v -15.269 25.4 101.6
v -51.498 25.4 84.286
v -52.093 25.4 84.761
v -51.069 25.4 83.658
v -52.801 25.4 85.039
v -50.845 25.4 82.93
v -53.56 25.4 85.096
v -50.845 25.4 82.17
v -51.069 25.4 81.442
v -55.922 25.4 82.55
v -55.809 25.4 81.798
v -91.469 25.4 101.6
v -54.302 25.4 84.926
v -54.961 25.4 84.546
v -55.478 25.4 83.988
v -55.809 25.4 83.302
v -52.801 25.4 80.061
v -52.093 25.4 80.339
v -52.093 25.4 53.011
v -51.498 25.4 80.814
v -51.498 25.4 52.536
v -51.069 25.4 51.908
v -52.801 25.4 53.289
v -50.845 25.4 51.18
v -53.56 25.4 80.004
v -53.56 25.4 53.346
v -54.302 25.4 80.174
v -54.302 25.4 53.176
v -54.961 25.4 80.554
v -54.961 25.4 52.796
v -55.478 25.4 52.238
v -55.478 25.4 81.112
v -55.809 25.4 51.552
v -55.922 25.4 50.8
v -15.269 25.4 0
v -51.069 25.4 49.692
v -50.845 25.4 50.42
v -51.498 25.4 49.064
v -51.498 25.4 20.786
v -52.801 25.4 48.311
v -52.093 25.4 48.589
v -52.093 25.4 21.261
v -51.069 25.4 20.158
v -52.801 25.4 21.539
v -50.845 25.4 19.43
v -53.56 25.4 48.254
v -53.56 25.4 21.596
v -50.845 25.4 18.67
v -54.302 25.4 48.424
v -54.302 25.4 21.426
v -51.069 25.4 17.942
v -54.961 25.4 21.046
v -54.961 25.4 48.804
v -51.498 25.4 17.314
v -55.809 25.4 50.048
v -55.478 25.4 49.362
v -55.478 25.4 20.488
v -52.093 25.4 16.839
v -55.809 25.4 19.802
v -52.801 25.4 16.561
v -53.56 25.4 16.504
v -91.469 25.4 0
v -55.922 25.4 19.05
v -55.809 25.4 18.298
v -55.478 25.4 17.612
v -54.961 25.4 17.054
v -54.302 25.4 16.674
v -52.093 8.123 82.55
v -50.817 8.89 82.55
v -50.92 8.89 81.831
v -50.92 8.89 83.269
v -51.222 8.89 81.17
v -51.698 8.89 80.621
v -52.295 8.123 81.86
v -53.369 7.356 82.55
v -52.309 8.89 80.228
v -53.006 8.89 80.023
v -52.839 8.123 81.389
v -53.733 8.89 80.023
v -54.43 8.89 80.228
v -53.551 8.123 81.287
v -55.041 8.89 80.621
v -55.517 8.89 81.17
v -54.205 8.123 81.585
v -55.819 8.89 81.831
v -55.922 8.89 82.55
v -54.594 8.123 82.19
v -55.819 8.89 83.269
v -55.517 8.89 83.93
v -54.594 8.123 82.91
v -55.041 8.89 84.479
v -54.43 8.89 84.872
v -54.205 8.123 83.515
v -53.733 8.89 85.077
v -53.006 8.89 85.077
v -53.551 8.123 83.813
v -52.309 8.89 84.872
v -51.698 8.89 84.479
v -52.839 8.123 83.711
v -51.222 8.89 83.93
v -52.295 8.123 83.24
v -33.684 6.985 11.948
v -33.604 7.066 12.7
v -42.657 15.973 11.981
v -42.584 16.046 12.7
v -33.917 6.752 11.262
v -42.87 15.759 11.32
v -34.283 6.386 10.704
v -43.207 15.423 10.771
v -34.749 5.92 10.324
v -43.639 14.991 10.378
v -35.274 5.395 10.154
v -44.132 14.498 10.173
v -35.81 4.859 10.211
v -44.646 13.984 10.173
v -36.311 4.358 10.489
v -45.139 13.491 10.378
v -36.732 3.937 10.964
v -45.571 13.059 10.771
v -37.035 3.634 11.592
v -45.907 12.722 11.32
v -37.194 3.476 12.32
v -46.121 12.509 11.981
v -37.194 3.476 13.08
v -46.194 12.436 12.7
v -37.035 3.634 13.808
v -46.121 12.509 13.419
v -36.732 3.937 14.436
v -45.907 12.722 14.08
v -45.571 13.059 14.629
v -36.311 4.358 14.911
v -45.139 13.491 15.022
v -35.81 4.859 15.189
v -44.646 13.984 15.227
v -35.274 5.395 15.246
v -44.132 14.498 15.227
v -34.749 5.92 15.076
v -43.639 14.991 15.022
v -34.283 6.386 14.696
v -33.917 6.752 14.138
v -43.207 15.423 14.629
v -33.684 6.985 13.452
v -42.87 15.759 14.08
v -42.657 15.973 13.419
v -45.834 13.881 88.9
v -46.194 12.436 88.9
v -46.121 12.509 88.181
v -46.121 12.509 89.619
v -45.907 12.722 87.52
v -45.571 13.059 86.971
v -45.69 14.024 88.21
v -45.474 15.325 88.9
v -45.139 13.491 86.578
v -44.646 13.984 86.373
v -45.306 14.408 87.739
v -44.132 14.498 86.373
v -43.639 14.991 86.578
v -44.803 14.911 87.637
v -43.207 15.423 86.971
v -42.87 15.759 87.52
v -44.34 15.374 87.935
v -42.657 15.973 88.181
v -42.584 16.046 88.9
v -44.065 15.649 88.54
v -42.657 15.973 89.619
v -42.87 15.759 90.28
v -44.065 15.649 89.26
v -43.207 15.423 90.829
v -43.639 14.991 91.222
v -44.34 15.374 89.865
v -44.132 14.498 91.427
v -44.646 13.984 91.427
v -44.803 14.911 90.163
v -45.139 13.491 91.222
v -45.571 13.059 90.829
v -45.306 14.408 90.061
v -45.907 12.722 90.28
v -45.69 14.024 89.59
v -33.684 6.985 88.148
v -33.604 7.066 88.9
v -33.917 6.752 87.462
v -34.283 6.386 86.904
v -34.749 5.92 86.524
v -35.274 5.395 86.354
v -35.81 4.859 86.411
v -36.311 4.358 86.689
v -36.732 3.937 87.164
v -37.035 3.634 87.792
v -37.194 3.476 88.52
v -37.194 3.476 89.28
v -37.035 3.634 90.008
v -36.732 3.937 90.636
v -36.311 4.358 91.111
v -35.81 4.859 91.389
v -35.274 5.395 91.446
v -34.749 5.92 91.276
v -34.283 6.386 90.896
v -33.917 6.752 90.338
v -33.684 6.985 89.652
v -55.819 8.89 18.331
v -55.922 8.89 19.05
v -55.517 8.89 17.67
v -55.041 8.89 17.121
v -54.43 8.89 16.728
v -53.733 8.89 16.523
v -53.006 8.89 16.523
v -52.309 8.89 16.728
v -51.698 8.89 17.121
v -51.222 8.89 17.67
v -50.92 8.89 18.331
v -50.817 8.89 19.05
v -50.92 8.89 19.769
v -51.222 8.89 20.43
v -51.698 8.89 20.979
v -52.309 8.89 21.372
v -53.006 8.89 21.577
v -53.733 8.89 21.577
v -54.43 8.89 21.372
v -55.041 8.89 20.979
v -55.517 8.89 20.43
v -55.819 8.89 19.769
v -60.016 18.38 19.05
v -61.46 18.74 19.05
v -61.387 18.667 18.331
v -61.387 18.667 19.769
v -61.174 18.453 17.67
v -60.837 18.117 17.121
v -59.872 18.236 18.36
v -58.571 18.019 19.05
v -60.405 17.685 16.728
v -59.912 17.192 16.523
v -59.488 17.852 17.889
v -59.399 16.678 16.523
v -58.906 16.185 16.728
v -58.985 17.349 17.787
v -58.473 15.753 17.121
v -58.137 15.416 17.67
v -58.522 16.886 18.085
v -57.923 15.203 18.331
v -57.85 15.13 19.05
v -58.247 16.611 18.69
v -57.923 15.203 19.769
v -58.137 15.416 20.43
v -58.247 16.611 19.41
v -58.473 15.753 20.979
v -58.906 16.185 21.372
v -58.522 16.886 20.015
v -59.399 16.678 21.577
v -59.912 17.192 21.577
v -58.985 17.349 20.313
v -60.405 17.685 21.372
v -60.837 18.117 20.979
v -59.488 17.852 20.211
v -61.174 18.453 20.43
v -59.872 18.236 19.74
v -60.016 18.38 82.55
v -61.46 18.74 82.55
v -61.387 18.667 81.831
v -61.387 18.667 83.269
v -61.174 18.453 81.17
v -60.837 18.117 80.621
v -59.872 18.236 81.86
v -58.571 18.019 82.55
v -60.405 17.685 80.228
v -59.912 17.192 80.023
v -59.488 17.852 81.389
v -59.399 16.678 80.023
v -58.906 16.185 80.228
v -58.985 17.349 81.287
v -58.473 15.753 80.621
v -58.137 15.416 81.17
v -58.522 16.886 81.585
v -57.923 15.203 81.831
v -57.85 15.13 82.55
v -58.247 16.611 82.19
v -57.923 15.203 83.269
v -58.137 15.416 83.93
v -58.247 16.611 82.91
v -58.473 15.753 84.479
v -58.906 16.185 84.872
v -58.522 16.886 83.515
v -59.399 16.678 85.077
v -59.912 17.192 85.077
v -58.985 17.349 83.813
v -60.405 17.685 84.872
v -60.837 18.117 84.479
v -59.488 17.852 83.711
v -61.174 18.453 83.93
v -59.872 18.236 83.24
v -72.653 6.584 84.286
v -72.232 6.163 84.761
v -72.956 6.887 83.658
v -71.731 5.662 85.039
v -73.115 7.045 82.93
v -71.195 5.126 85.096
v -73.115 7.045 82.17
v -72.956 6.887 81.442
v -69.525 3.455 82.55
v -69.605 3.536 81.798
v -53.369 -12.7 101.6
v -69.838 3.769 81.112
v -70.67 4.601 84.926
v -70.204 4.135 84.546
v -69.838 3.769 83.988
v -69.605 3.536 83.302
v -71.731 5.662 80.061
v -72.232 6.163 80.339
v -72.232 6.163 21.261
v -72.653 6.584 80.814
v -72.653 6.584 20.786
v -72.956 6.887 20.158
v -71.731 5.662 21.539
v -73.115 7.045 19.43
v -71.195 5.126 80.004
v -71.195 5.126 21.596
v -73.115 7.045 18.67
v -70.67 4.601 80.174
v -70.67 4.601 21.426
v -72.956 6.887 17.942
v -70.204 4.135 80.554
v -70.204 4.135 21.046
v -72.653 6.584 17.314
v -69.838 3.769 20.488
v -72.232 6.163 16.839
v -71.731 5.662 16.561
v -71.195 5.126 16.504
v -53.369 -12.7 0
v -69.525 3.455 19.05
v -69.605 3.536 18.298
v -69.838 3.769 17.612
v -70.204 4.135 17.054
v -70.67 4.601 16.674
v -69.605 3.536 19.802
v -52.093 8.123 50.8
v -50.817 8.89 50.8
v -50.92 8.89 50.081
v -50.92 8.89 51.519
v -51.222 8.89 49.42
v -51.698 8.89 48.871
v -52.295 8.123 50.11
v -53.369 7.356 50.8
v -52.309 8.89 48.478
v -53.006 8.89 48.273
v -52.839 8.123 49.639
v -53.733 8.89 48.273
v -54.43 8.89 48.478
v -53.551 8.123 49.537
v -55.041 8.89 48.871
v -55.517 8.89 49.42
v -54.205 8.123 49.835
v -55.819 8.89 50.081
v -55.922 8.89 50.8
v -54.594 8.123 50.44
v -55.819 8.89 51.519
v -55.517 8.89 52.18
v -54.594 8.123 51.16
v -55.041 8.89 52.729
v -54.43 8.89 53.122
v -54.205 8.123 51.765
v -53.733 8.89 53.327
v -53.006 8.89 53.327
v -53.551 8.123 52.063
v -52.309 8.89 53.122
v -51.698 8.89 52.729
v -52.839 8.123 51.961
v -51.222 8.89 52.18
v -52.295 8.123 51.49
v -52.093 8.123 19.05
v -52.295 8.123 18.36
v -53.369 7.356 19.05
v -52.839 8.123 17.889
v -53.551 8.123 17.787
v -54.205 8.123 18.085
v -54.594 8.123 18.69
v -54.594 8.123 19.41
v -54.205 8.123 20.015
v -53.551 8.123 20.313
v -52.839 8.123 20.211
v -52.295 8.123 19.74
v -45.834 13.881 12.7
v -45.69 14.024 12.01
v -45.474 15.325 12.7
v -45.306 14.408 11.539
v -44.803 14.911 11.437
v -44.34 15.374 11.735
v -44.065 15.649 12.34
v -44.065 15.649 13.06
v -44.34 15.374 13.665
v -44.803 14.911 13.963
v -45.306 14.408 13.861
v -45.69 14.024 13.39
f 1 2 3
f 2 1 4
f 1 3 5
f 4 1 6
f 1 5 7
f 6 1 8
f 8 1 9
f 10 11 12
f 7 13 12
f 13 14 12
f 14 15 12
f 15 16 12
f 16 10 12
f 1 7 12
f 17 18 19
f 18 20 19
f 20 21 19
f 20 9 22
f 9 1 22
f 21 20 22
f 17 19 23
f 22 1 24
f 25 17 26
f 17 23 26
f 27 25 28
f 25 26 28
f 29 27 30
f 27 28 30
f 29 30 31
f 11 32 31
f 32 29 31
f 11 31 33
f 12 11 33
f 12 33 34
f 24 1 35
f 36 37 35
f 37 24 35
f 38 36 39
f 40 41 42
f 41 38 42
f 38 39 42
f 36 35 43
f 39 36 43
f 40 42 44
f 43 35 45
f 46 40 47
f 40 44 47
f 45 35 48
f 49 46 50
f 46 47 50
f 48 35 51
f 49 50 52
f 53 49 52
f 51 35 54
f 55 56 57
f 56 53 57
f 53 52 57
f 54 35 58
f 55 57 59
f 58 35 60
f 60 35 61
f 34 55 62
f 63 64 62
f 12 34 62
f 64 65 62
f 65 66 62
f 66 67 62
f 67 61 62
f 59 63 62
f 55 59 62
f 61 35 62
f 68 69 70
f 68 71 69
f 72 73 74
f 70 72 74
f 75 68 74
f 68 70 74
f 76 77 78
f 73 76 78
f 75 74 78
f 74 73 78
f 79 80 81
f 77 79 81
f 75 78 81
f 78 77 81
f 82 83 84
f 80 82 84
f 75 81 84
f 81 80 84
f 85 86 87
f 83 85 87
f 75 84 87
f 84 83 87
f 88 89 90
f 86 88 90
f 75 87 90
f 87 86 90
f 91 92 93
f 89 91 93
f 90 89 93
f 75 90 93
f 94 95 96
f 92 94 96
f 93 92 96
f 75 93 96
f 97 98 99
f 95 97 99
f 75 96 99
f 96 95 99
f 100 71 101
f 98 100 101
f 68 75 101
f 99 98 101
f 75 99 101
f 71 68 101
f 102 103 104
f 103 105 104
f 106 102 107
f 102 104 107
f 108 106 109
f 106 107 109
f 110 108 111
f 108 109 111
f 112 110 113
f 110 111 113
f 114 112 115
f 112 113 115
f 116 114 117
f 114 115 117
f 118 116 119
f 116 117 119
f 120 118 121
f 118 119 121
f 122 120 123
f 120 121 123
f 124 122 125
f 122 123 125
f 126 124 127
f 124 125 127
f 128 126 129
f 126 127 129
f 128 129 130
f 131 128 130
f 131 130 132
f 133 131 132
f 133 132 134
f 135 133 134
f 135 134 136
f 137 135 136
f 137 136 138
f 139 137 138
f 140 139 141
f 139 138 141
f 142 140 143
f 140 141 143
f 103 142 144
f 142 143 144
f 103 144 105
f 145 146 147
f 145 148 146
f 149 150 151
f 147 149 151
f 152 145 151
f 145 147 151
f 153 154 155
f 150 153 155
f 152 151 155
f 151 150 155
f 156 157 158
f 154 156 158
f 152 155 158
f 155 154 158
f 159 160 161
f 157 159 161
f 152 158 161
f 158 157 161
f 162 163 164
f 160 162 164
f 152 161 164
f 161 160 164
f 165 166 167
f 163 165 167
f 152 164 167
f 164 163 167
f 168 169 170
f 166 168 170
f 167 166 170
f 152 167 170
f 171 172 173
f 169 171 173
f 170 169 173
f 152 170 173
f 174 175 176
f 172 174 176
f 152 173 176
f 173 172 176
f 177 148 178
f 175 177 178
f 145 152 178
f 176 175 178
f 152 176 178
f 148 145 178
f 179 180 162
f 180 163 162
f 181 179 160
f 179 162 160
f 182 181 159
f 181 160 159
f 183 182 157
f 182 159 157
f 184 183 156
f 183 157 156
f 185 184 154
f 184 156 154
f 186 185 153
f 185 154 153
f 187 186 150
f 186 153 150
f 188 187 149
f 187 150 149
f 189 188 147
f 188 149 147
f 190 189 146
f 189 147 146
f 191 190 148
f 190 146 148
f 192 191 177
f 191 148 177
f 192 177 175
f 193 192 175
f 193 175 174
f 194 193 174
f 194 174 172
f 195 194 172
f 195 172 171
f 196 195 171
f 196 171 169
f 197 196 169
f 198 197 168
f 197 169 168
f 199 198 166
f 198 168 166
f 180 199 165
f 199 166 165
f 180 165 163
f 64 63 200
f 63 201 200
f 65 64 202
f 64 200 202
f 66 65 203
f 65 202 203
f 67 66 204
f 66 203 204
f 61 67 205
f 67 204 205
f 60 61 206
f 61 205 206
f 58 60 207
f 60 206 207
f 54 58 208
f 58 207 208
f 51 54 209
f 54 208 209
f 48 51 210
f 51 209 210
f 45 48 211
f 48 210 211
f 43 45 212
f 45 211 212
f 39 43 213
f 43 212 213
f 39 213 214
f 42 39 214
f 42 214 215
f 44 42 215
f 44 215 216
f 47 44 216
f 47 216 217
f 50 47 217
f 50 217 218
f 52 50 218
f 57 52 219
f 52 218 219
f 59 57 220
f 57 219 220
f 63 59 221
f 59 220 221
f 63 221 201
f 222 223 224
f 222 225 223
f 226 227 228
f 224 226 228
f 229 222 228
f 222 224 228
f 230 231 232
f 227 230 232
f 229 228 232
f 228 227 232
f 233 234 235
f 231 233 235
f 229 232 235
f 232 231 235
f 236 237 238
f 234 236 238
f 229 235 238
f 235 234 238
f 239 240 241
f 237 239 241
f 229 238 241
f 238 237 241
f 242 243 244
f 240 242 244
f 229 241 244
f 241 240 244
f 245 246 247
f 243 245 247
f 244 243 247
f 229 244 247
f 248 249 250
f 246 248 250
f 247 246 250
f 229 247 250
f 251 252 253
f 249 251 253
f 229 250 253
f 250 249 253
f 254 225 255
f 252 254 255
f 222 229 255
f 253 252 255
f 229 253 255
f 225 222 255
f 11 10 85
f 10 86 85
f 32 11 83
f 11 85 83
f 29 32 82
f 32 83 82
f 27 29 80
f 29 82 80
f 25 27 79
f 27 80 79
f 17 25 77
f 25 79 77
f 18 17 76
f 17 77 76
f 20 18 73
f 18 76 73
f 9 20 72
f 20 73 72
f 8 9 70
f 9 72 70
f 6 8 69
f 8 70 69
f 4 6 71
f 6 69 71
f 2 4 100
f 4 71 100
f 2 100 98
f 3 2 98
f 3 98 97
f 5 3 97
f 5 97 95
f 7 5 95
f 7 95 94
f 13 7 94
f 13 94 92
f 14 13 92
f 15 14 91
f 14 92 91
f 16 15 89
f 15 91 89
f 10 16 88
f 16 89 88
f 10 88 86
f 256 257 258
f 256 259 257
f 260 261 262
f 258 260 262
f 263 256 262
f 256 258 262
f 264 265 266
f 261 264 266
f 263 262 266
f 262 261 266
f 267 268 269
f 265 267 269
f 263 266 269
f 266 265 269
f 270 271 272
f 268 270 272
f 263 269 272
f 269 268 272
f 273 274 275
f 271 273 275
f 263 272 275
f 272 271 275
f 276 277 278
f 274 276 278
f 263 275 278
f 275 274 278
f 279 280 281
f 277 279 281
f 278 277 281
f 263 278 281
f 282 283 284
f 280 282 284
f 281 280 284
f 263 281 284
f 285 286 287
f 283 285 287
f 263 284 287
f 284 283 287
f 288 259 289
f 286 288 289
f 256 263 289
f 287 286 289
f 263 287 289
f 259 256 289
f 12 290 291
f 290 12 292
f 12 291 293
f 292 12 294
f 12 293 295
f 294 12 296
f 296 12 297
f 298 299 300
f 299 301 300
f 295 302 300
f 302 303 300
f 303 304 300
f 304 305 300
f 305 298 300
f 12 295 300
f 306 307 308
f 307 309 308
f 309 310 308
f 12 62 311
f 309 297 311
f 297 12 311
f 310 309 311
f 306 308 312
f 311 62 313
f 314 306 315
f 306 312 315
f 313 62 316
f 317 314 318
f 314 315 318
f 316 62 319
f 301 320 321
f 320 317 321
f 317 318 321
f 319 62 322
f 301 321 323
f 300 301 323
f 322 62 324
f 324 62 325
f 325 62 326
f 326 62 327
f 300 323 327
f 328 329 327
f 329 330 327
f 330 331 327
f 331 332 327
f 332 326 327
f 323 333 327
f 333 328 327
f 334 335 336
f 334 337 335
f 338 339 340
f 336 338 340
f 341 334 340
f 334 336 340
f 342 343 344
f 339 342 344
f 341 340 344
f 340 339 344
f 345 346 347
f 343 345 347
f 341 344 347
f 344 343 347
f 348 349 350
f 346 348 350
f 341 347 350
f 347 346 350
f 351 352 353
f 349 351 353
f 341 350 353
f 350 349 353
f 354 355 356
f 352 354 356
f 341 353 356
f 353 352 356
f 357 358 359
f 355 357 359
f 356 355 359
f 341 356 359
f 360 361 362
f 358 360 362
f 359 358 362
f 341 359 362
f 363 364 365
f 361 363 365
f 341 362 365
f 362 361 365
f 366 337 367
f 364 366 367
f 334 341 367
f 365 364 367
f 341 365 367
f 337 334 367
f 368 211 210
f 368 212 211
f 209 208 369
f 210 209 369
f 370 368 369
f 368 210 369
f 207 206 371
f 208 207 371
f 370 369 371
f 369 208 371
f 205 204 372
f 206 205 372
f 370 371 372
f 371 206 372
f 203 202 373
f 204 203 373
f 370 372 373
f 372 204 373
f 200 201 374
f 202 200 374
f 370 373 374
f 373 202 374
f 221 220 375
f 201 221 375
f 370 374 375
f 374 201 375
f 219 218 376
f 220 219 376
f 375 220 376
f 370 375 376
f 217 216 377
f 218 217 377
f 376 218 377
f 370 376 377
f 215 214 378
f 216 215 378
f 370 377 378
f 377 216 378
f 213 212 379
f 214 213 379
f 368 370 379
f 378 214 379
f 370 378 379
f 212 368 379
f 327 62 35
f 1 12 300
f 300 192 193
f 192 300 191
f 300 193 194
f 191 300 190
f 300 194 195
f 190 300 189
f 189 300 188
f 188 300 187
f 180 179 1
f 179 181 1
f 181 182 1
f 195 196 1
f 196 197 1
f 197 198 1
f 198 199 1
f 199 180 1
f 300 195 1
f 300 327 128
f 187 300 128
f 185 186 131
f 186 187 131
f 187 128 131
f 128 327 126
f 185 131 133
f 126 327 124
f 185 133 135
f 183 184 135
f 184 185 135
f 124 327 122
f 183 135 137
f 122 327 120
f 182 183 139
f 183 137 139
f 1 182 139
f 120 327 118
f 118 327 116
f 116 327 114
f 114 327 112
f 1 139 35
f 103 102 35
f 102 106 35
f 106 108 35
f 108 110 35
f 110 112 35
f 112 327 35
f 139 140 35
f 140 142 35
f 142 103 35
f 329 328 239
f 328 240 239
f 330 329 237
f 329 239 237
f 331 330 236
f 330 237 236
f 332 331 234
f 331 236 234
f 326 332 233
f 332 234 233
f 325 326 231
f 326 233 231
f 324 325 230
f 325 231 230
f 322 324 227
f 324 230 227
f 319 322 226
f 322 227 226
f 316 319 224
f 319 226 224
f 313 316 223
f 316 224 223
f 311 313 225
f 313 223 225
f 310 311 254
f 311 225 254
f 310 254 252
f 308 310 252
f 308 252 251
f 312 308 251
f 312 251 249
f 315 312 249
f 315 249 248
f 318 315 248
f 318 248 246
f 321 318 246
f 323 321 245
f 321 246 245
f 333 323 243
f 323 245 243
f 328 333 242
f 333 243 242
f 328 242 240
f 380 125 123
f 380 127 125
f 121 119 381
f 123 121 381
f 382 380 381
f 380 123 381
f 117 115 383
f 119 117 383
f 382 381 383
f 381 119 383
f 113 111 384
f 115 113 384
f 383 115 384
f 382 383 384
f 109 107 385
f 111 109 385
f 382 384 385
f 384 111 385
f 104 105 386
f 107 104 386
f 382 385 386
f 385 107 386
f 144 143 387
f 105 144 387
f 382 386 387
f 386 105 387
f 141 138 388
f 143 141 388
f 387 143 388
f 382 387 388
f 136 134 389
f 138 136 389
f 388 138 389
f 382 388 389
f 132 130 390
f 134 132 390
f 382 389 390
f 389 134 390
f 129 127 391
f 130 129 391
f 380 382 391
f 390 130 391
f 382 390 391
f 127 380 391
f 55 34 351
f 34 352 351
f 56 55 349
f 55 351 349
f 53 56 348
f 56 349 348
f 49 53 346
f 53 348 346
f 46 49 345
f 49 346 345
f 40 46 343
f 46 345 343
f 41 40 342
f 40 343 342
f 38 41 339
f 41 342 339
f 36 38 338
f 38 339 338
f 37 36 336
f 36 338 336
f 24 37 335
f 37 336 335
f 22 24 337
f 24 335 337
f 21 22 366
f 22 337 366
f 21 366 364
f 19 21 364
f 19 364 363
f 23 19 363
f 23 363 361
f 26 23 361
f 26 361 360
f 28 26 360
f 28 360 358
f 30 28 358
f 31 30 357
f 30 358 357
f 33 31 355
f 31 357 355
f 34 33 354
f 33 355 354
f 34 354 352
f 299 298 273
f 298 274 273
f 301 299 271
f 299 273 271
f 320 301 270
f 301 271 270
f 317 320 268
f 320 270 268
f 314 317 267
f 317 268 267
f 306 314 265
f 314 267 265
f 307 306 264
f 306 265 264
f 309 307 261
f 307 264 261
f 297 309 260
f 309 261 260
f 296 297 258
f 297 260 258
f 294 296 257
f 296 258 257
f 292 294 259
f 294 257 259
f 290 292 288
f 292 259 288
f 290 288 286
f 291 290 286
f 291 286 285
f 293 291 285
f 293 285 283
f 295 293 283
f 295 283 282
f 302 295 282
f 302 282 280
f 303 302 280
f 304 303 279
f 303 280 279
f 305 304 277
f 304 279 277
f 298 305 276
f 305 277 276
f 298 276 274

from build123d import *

# Parameters (mm, degrees)
MAIN_EXTRUDE_DEPTH        = 101.6
MOUNTING_HOLES_D          = 5.1054
MOUNTING_HOLES_DEPTH      = 16.51
MOUNTING_HOLES_TIP        = 1.533816902
BEARING_MOUNT_LEFT_D      = 5.1054
BEARING_MOUNT_LEFT_DEPTH  = 12.7
BEARING_MOUNT_LEFT_TIP    = 1.533816902
BEARING_MOUNT_RIGHT_D     = 5.1054
BEARING_MOUNT_RIGHT_DEPTH = 16.51
BEARING_MOUNT_RIGHT_TIP   = 1.533816902


with BuildPart() as part:
    # Sketch2 → Main extrude (new body)
    with BuildSketch(Plane.XY):
        Polygon((-91.469223626, 25.4), (-53.369223626, -12.7), (-15.269223626, 25.4), align=None)
    extrude(amount=MAIN_EXTRUDE_DEPTH)

    # Mounting holes
    with Locations(Plane(origin=(0, 25.4, 0), x_dir=(1, 0, 0), z_dir=(0, 1, 0))):
        with Locations((-53.369223626, -19.05), (-53.369223626, -82.55), (-53.369223626, -50.8)):
            Hole(MOUNTING_HOLES_D / 2, depth=MOUNTING_HOLES_DEPTH)
            with Locations((0, 0, -(MOUNTING_HOLES_DEPTH + MOUNTING_HOLES_TIP / 2))):  # 118° drill point
                Cone(0, MOUNTING_HOLES_D / 2, MOUNTING_HOLES_TIP, mode=Mode.SUBTRACT)

    # Bearing mount left
    with Locations(Plane(origin=(-20.334611813, 20.334611813, 0), x_dir=(-0.707106781, -0.707106781, 0), z_dir=(0.707106781, -0.707106781, 0))):
        with Locations((21.317996054, -12.7), (21.317996054, -88.9)):
            Hole(BEARING_MOUNT_LEFT_D / 2, depth=BEARING_MOUNT_LEFT_DEPTH)
            with Locations((0, 0, -(BEARING_MOUNT_LEFT_DEPTH + BEARING_MOUNT_LEFT_TIP / 2))):  # 118° drill point
                Cone(0, BEARING_MOUNT_LEFT_D / 2, BEARING_MOUNT_LEFT_TIP, mode=Mode.SUBTRACT)

    # Bearing mount right
    with Locations(Plane(origin=(-33.034611813, -33.034611813, 0), x_dir=(-0.707106781, 0.707106781, 0), z_dir=(-0.707106781, -0.707106781, 0))):
        with Locations((54.157483812, -82.55), (54.157483812, -19.05)):
            Hole(BEARING_MOUNT_RIGHT_D / 2, depth=BEARING_MOUNT_RIGHT_DEPTH)
            with Locations((0, 0, -(BEARING_MOUNT_RIGHT_DEPTH + BEARING_MOUNT_RIGHT_TIP / 2))):  # 118° drill point
                Cone(0, BEARING_MOUNT_RIGHT_D / 2, BEARING_MOUNT_RIGHT_TIP, mode=Mode.SUBTRACT)


solid = part.part
